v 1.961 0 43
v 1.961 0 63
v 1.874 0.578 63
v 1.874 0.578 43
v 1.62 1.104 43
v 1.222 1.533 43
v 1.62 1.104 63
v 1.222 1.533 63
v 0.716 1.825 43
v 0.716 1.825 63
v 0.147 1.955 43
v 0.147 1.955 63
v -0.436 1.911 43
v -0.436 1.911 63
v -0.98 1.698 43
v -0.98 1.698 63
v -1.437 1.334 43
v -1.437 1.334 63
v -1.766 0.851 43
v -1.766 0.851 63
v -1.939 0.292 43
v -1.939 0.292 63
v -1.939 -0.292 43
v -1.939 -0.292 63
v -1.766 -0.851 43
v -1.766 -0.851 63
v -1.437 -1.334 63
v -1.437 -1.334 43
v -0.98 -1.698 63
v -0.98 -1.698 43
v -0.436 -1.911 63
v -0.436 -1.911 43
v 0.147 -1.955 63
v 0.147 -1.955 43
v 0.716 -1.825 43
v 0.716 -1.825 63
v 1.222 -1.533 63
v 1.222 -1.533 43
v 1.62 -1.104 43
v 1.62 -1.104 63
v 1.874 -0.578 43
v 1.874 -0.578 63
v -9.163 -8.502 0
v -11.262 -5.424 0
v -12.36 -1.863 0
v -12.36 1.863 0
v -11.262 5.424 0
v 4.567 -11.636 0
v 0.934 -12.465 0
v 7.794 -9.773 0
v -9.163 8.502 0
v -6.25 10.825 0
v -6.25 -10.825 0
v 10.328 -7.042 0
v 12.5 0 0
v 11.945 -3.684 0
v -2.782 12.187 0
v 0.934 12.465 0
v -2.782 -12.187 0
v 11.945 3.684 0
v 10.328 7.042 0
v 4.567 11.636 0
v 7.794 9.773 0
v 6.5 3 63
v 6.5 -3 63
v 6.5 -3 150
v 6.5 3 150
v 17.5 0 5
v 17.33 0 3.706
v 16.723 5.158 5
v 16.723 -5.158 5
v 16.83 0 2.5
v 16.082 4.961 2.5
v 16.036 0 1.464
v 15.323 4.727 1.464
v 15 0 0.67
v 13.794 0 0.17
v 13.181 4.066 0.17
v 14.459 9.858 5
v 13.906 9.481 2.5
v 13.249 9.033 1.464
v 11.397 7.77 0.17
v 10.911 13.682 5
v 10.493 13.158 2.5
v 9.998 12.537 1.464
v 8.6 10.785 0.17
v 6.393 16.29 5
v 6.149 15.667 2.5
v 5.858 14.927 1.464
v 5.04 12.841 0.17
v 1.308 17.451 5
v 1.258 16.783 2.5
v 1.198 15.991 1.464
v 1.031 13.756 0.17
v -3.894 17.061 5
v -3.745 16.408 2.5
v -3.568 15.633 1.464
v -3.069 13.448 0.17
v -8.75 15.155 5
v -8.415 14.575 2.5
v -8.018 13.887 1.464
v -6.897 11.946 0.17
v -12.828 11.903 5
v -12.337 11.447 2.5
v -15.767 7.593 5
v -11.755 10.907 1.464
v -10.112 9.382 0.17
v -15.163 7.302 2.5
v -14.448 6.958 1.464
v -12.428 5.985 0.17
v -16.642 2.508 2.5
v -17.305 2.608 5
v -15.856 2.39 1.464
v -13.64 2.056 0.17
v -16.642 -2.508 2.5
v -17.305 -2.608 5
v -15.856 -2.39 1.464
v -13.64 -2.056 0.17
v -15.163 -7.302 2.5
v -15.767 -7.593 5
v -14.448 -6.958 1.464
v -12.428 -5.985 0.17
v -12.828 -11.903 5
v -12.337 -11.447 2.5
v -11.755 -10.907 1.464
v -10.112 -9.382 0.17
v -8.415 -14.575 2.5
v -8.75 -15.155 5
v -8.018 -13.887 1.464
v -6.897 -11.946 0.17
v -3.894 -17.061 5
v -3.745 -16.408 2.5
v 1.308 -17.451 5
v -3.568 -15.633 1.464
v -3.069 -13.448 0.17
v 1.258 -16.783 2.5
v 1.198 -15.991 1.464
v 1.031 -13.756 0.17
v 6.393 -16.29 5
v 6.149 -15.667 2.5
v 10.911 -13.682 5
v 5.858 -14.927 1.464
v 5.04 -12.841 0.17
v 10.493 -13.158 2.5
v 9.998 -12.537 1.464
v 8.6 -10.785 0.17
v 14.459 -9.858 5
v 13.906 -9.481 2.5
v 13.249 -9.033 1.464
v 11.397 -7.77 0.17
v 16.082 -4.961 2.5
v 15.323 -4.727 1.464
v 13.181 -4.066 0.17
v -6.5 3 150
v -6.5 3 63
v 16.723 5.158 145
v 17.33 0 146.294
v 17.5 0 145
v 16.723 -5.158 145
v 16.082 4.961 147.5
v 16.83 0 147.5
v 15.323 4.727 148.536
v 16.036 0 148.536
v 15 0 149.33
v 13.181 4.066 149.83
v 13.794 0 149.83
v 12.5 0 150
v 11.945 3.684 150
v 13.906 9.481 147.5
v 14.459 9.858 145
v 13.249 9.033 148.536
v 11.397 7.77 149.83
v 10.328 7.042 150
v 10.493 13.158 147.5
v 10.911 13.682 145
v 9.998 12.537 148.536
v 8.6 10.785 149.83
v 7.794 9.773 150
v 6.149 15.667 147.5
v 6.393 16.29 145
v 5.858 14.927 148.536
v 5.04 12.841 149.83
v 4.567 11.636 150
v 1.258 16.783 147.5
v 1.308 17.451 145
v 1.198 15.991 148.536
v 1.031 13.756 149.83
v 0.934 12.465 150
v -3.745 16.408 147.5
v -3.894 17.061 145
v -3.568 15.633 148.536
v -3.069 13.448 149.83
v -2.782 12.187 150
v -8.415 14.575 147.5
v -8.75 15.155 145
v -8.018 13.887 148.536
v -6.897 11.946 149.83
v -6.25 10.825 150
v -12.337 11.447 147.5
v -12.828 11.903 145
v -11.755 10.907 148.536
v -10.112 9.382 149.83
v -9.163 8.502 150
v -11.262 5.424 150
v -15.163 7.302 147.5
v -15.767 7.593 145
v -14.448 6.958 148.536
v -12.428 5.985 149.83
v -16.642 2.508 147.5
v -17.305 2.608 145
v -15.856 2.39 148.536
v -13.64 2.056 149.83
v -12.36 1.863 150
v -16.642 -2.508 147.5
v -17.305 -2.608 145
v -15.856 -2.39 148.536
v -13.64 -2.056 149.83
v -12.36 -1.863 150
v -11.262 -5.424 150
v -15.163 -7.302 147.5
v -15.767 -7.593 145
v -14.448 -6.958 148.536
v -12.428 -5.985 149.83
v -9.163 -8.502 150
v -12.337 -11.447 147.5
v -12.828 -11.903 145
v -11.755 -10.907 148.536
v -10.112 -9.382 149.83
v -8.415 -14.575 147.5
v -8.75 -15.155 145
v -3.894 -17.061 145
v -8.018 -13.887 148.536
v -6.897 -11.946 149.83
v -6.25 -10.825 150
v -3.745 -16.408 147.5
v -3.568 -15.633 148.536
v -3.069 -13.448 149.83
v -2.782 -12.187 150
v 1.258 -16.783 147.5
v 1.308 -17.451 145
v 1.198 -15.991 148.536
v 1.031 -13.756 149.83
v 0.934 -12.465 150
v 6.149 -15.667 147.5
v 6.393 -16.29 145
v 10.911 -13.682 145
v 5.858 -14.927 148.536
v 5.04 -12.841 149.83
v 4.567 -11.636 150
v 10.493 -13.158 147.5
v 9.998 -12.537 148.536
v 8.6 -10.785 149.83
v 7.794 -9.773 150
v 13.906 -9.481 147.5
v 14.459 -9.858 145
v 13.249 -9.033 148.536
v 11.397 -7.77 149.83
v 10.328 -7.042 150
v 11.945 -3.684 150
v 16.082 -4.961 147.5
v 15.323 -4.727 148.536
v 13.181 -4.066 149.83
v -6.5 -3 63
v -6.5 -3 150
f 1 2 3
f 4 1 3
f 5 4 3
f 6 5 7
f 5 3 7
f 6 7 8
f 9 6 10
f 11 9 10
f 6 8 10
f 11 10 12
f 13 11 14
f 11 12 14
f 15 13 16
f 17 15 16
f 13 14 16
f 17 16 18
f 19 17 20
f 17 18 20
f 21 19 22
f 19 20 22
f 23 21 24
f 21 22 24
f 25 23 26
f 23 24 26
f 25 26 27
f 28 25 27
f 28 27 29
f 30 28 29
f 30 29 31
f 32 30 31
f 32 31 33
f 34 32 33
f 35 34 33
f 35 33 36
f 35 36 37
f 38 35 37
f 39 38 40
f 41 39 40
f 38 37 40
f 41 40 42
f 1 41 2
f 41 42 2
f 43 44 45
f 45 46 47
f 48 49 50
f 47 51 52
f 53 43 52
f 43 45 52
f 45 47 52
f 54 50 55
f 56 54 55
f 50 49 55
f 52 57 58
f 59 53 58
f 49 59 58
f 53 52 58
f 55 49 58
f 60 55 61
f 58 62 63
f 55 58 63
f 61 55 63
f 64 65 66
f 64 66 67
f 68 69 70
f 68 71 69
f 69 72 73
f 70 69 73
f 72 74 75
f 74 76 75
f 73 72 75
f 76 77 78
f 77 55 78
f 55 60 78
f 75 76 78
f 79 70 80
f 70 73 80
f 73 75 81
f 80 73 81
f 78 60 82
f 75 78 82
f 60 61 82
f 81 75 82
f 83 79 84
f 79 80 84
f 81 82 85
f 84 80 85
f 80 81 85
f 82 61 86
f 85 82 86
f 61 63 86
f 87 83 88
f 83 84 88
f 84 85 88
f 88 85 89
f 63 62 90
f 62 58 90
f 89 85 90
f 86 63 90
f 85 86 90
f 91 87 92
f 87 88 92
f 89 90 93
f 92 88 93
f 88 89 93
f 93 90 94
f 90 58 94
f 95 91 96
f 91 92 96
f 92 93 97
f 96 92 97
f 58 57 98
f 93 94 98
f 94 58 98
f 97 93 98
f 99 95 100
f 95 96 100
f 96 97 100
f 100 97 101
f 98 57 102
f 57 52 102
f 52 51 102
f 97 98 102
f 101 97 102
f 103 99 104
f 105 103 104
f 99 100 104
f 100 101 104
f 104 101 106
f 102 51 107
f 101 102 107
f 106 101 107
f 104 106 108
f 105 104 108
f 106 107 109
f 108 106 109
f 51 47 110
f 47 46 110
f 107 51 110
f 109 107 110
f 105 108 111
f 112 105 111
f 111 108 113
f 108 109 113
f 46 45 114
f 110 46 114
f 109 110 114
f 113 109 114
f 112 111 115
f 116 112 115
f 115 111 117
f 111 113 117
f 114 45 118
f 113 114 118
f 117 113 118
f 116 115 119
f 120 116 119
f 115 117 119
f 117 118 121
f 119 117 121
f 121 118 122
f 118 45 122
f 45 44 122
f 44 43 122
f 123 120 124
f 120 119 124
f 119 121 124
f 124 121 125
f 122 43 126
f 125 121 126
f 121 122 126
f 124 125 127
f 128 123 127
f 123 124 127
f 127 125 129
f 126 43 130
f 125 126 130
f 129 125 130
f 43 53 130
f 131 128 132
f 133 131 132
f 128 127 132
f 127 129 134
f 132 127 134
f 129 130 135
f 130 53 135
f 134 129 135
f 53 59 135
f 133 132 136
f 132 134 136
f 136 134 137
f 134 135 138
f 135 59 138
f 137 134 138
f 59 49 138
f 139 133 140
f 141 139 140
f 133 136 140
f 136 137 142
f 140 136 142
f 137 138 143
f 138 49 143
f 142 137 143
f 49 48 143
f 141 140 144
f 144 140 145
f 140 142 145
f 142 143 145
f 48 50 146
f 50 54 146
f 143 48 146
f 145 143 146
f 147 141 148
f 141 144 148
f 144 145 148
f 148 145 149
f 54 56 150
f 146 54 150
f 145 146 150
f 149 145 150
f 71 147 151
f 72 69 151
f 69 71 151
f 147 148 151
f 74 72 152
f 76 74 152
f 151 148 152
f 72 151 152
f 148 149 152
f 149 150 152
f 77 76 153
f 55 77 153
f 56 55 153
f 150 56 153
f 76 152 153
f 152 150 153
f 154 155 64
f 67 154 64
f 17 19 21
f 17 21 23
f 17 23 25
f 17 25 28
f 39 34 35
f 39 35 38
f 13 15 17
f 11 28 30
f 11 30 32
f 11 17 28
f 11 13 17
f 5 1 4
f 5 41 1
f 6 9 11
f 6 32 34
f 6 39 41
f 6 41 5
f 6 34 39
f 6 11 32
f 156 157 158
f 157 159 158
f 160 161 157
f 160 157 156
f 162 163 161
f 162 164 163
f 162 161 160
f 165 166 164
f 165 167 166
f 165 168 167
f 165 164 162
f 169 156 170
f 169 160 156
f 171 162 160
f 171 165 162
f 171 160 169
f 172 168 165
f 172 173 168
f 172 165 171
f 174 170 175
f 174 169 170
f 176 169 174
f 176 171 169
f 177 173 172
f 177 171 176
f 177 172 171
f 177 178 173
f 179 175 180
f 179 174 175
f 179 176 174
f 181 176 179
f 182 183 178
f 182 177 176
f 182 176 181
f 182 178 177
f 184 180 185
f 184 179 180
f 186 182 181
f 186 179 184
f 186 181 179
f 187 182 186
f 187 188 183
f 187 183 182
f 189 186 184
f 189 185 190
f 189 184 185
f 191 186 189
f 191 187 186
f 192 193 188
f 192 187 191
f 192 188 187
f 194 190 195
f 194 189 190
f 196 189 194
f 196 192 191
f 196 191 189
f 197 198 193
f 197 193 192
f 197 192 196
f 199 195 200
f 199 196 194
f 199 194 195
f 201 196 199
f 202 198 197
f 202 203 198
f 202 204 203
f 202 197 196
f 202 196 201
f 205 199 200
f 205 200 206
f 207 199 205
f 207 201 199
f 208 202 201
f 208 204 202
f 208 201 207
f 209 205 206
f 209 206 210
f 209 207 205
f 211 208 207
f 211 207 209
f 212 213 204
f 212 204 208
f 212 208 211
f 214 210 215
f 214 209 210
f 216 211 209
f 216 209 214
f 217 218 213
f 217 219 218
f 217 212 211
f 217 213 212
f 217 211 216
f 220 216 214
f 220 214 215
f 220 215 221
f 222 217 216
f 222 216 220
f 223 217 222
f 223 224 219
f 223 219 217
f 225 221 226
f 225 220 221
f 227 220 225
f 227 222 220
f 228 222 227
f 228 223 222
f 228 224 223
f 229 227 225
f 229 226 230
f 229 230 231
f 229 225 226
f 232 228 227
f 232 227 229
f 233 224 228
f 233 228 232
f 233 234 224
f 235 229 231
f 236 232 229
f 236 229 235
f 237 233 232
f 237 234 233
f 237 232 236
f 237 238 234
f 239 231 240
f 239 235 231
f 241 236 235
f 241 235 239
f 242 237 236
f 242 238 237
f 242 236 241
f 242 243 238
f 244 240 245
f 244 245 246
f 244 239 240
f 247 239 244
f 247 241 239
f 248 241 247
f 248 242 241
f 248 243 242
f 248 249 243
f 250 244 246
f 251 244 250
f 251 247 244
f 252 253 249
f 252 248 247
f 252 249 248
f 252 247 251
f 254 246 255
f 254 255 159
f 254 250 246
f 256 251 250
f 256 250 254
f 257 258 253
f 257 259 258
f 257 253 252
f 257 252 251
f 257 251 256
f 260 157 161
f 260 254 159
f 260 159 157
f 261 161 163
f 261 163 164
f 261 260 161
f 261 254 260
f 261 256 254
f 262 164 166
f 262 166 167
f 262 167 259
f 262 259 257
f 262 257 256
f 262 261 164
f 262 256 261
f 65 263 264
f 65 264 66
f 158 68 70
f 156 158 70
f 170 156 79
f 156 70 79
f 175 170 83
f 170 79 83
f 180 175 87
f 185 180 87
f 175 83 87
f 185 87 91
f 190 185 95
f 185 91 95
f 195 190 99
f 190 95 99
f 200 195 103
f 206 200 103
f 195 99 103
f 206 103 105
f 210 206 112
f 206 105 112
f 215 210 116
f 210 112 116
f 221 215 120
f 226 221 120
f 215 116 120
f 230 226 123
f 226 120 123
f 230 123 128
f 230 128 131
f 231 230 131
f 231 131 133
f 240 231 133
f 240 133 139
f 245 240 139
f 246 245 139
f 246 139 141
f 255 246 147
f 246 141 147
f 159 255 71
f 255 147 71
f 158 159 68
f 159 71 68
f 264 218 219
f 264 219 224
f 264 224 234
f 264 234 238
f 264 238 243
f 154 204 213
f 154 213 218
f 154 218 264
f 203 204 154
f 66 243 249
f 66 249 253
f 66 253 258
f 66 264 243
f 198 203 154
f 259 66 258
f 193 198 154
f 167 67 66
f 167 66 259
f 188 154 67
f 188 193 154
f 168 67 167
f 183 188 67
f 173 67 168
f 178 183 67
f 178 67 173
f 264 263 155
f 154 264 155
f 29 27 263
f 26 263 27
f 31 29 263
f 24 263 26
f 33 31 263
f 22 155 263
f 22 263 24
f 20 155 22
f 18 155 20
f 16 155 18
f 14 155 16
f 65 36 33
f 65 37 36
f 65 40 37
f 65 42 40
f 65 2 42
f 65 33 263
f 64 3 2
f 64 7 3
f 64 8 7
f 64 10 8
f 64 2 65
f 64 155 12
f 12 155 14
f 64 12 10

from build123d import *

# Parameters (mm, degrees)
F0_R     = 17.5
F1_DEPTH = 150
F2_W     = 13
F2_H     = 6
F3_DEPTH = 87
F4_R     = 1.960614
F5_DEPTH = 20
F6_R     = 5


with BuildPart() as f1:
    # F0 (on Top) → F1 (new body)
    with BuildSketch(Plane.XY):
        Circle(F0_R)
    extrude(amount=F1_DEPTH)

    # F2 (on face) → F3 (cut)
    with BuildSketch(Plane.XY.offset(150)):
        Rectangle(F2_W, F2_H)
    extrude(amount=-F3_DEPTH, mode=Mode.SUBTRACT)

    # F4 (on face) → F5 (cut)
    with BuildSketch(Plane.XY.offset(63)):
        Circle(F4_R)
    extrude(amount=-F5_DEPTH, mode=Mode.SUBTRACT)

    # F6
    f6_edges = [f1.edges().sort_by_distance(p)[0] for p in [
        (-17.5, 0, 150),
        (-17.5, 0, 0),
    ]]
    fillet(f6_edges, radius=F6_R)


solid = f1.part
